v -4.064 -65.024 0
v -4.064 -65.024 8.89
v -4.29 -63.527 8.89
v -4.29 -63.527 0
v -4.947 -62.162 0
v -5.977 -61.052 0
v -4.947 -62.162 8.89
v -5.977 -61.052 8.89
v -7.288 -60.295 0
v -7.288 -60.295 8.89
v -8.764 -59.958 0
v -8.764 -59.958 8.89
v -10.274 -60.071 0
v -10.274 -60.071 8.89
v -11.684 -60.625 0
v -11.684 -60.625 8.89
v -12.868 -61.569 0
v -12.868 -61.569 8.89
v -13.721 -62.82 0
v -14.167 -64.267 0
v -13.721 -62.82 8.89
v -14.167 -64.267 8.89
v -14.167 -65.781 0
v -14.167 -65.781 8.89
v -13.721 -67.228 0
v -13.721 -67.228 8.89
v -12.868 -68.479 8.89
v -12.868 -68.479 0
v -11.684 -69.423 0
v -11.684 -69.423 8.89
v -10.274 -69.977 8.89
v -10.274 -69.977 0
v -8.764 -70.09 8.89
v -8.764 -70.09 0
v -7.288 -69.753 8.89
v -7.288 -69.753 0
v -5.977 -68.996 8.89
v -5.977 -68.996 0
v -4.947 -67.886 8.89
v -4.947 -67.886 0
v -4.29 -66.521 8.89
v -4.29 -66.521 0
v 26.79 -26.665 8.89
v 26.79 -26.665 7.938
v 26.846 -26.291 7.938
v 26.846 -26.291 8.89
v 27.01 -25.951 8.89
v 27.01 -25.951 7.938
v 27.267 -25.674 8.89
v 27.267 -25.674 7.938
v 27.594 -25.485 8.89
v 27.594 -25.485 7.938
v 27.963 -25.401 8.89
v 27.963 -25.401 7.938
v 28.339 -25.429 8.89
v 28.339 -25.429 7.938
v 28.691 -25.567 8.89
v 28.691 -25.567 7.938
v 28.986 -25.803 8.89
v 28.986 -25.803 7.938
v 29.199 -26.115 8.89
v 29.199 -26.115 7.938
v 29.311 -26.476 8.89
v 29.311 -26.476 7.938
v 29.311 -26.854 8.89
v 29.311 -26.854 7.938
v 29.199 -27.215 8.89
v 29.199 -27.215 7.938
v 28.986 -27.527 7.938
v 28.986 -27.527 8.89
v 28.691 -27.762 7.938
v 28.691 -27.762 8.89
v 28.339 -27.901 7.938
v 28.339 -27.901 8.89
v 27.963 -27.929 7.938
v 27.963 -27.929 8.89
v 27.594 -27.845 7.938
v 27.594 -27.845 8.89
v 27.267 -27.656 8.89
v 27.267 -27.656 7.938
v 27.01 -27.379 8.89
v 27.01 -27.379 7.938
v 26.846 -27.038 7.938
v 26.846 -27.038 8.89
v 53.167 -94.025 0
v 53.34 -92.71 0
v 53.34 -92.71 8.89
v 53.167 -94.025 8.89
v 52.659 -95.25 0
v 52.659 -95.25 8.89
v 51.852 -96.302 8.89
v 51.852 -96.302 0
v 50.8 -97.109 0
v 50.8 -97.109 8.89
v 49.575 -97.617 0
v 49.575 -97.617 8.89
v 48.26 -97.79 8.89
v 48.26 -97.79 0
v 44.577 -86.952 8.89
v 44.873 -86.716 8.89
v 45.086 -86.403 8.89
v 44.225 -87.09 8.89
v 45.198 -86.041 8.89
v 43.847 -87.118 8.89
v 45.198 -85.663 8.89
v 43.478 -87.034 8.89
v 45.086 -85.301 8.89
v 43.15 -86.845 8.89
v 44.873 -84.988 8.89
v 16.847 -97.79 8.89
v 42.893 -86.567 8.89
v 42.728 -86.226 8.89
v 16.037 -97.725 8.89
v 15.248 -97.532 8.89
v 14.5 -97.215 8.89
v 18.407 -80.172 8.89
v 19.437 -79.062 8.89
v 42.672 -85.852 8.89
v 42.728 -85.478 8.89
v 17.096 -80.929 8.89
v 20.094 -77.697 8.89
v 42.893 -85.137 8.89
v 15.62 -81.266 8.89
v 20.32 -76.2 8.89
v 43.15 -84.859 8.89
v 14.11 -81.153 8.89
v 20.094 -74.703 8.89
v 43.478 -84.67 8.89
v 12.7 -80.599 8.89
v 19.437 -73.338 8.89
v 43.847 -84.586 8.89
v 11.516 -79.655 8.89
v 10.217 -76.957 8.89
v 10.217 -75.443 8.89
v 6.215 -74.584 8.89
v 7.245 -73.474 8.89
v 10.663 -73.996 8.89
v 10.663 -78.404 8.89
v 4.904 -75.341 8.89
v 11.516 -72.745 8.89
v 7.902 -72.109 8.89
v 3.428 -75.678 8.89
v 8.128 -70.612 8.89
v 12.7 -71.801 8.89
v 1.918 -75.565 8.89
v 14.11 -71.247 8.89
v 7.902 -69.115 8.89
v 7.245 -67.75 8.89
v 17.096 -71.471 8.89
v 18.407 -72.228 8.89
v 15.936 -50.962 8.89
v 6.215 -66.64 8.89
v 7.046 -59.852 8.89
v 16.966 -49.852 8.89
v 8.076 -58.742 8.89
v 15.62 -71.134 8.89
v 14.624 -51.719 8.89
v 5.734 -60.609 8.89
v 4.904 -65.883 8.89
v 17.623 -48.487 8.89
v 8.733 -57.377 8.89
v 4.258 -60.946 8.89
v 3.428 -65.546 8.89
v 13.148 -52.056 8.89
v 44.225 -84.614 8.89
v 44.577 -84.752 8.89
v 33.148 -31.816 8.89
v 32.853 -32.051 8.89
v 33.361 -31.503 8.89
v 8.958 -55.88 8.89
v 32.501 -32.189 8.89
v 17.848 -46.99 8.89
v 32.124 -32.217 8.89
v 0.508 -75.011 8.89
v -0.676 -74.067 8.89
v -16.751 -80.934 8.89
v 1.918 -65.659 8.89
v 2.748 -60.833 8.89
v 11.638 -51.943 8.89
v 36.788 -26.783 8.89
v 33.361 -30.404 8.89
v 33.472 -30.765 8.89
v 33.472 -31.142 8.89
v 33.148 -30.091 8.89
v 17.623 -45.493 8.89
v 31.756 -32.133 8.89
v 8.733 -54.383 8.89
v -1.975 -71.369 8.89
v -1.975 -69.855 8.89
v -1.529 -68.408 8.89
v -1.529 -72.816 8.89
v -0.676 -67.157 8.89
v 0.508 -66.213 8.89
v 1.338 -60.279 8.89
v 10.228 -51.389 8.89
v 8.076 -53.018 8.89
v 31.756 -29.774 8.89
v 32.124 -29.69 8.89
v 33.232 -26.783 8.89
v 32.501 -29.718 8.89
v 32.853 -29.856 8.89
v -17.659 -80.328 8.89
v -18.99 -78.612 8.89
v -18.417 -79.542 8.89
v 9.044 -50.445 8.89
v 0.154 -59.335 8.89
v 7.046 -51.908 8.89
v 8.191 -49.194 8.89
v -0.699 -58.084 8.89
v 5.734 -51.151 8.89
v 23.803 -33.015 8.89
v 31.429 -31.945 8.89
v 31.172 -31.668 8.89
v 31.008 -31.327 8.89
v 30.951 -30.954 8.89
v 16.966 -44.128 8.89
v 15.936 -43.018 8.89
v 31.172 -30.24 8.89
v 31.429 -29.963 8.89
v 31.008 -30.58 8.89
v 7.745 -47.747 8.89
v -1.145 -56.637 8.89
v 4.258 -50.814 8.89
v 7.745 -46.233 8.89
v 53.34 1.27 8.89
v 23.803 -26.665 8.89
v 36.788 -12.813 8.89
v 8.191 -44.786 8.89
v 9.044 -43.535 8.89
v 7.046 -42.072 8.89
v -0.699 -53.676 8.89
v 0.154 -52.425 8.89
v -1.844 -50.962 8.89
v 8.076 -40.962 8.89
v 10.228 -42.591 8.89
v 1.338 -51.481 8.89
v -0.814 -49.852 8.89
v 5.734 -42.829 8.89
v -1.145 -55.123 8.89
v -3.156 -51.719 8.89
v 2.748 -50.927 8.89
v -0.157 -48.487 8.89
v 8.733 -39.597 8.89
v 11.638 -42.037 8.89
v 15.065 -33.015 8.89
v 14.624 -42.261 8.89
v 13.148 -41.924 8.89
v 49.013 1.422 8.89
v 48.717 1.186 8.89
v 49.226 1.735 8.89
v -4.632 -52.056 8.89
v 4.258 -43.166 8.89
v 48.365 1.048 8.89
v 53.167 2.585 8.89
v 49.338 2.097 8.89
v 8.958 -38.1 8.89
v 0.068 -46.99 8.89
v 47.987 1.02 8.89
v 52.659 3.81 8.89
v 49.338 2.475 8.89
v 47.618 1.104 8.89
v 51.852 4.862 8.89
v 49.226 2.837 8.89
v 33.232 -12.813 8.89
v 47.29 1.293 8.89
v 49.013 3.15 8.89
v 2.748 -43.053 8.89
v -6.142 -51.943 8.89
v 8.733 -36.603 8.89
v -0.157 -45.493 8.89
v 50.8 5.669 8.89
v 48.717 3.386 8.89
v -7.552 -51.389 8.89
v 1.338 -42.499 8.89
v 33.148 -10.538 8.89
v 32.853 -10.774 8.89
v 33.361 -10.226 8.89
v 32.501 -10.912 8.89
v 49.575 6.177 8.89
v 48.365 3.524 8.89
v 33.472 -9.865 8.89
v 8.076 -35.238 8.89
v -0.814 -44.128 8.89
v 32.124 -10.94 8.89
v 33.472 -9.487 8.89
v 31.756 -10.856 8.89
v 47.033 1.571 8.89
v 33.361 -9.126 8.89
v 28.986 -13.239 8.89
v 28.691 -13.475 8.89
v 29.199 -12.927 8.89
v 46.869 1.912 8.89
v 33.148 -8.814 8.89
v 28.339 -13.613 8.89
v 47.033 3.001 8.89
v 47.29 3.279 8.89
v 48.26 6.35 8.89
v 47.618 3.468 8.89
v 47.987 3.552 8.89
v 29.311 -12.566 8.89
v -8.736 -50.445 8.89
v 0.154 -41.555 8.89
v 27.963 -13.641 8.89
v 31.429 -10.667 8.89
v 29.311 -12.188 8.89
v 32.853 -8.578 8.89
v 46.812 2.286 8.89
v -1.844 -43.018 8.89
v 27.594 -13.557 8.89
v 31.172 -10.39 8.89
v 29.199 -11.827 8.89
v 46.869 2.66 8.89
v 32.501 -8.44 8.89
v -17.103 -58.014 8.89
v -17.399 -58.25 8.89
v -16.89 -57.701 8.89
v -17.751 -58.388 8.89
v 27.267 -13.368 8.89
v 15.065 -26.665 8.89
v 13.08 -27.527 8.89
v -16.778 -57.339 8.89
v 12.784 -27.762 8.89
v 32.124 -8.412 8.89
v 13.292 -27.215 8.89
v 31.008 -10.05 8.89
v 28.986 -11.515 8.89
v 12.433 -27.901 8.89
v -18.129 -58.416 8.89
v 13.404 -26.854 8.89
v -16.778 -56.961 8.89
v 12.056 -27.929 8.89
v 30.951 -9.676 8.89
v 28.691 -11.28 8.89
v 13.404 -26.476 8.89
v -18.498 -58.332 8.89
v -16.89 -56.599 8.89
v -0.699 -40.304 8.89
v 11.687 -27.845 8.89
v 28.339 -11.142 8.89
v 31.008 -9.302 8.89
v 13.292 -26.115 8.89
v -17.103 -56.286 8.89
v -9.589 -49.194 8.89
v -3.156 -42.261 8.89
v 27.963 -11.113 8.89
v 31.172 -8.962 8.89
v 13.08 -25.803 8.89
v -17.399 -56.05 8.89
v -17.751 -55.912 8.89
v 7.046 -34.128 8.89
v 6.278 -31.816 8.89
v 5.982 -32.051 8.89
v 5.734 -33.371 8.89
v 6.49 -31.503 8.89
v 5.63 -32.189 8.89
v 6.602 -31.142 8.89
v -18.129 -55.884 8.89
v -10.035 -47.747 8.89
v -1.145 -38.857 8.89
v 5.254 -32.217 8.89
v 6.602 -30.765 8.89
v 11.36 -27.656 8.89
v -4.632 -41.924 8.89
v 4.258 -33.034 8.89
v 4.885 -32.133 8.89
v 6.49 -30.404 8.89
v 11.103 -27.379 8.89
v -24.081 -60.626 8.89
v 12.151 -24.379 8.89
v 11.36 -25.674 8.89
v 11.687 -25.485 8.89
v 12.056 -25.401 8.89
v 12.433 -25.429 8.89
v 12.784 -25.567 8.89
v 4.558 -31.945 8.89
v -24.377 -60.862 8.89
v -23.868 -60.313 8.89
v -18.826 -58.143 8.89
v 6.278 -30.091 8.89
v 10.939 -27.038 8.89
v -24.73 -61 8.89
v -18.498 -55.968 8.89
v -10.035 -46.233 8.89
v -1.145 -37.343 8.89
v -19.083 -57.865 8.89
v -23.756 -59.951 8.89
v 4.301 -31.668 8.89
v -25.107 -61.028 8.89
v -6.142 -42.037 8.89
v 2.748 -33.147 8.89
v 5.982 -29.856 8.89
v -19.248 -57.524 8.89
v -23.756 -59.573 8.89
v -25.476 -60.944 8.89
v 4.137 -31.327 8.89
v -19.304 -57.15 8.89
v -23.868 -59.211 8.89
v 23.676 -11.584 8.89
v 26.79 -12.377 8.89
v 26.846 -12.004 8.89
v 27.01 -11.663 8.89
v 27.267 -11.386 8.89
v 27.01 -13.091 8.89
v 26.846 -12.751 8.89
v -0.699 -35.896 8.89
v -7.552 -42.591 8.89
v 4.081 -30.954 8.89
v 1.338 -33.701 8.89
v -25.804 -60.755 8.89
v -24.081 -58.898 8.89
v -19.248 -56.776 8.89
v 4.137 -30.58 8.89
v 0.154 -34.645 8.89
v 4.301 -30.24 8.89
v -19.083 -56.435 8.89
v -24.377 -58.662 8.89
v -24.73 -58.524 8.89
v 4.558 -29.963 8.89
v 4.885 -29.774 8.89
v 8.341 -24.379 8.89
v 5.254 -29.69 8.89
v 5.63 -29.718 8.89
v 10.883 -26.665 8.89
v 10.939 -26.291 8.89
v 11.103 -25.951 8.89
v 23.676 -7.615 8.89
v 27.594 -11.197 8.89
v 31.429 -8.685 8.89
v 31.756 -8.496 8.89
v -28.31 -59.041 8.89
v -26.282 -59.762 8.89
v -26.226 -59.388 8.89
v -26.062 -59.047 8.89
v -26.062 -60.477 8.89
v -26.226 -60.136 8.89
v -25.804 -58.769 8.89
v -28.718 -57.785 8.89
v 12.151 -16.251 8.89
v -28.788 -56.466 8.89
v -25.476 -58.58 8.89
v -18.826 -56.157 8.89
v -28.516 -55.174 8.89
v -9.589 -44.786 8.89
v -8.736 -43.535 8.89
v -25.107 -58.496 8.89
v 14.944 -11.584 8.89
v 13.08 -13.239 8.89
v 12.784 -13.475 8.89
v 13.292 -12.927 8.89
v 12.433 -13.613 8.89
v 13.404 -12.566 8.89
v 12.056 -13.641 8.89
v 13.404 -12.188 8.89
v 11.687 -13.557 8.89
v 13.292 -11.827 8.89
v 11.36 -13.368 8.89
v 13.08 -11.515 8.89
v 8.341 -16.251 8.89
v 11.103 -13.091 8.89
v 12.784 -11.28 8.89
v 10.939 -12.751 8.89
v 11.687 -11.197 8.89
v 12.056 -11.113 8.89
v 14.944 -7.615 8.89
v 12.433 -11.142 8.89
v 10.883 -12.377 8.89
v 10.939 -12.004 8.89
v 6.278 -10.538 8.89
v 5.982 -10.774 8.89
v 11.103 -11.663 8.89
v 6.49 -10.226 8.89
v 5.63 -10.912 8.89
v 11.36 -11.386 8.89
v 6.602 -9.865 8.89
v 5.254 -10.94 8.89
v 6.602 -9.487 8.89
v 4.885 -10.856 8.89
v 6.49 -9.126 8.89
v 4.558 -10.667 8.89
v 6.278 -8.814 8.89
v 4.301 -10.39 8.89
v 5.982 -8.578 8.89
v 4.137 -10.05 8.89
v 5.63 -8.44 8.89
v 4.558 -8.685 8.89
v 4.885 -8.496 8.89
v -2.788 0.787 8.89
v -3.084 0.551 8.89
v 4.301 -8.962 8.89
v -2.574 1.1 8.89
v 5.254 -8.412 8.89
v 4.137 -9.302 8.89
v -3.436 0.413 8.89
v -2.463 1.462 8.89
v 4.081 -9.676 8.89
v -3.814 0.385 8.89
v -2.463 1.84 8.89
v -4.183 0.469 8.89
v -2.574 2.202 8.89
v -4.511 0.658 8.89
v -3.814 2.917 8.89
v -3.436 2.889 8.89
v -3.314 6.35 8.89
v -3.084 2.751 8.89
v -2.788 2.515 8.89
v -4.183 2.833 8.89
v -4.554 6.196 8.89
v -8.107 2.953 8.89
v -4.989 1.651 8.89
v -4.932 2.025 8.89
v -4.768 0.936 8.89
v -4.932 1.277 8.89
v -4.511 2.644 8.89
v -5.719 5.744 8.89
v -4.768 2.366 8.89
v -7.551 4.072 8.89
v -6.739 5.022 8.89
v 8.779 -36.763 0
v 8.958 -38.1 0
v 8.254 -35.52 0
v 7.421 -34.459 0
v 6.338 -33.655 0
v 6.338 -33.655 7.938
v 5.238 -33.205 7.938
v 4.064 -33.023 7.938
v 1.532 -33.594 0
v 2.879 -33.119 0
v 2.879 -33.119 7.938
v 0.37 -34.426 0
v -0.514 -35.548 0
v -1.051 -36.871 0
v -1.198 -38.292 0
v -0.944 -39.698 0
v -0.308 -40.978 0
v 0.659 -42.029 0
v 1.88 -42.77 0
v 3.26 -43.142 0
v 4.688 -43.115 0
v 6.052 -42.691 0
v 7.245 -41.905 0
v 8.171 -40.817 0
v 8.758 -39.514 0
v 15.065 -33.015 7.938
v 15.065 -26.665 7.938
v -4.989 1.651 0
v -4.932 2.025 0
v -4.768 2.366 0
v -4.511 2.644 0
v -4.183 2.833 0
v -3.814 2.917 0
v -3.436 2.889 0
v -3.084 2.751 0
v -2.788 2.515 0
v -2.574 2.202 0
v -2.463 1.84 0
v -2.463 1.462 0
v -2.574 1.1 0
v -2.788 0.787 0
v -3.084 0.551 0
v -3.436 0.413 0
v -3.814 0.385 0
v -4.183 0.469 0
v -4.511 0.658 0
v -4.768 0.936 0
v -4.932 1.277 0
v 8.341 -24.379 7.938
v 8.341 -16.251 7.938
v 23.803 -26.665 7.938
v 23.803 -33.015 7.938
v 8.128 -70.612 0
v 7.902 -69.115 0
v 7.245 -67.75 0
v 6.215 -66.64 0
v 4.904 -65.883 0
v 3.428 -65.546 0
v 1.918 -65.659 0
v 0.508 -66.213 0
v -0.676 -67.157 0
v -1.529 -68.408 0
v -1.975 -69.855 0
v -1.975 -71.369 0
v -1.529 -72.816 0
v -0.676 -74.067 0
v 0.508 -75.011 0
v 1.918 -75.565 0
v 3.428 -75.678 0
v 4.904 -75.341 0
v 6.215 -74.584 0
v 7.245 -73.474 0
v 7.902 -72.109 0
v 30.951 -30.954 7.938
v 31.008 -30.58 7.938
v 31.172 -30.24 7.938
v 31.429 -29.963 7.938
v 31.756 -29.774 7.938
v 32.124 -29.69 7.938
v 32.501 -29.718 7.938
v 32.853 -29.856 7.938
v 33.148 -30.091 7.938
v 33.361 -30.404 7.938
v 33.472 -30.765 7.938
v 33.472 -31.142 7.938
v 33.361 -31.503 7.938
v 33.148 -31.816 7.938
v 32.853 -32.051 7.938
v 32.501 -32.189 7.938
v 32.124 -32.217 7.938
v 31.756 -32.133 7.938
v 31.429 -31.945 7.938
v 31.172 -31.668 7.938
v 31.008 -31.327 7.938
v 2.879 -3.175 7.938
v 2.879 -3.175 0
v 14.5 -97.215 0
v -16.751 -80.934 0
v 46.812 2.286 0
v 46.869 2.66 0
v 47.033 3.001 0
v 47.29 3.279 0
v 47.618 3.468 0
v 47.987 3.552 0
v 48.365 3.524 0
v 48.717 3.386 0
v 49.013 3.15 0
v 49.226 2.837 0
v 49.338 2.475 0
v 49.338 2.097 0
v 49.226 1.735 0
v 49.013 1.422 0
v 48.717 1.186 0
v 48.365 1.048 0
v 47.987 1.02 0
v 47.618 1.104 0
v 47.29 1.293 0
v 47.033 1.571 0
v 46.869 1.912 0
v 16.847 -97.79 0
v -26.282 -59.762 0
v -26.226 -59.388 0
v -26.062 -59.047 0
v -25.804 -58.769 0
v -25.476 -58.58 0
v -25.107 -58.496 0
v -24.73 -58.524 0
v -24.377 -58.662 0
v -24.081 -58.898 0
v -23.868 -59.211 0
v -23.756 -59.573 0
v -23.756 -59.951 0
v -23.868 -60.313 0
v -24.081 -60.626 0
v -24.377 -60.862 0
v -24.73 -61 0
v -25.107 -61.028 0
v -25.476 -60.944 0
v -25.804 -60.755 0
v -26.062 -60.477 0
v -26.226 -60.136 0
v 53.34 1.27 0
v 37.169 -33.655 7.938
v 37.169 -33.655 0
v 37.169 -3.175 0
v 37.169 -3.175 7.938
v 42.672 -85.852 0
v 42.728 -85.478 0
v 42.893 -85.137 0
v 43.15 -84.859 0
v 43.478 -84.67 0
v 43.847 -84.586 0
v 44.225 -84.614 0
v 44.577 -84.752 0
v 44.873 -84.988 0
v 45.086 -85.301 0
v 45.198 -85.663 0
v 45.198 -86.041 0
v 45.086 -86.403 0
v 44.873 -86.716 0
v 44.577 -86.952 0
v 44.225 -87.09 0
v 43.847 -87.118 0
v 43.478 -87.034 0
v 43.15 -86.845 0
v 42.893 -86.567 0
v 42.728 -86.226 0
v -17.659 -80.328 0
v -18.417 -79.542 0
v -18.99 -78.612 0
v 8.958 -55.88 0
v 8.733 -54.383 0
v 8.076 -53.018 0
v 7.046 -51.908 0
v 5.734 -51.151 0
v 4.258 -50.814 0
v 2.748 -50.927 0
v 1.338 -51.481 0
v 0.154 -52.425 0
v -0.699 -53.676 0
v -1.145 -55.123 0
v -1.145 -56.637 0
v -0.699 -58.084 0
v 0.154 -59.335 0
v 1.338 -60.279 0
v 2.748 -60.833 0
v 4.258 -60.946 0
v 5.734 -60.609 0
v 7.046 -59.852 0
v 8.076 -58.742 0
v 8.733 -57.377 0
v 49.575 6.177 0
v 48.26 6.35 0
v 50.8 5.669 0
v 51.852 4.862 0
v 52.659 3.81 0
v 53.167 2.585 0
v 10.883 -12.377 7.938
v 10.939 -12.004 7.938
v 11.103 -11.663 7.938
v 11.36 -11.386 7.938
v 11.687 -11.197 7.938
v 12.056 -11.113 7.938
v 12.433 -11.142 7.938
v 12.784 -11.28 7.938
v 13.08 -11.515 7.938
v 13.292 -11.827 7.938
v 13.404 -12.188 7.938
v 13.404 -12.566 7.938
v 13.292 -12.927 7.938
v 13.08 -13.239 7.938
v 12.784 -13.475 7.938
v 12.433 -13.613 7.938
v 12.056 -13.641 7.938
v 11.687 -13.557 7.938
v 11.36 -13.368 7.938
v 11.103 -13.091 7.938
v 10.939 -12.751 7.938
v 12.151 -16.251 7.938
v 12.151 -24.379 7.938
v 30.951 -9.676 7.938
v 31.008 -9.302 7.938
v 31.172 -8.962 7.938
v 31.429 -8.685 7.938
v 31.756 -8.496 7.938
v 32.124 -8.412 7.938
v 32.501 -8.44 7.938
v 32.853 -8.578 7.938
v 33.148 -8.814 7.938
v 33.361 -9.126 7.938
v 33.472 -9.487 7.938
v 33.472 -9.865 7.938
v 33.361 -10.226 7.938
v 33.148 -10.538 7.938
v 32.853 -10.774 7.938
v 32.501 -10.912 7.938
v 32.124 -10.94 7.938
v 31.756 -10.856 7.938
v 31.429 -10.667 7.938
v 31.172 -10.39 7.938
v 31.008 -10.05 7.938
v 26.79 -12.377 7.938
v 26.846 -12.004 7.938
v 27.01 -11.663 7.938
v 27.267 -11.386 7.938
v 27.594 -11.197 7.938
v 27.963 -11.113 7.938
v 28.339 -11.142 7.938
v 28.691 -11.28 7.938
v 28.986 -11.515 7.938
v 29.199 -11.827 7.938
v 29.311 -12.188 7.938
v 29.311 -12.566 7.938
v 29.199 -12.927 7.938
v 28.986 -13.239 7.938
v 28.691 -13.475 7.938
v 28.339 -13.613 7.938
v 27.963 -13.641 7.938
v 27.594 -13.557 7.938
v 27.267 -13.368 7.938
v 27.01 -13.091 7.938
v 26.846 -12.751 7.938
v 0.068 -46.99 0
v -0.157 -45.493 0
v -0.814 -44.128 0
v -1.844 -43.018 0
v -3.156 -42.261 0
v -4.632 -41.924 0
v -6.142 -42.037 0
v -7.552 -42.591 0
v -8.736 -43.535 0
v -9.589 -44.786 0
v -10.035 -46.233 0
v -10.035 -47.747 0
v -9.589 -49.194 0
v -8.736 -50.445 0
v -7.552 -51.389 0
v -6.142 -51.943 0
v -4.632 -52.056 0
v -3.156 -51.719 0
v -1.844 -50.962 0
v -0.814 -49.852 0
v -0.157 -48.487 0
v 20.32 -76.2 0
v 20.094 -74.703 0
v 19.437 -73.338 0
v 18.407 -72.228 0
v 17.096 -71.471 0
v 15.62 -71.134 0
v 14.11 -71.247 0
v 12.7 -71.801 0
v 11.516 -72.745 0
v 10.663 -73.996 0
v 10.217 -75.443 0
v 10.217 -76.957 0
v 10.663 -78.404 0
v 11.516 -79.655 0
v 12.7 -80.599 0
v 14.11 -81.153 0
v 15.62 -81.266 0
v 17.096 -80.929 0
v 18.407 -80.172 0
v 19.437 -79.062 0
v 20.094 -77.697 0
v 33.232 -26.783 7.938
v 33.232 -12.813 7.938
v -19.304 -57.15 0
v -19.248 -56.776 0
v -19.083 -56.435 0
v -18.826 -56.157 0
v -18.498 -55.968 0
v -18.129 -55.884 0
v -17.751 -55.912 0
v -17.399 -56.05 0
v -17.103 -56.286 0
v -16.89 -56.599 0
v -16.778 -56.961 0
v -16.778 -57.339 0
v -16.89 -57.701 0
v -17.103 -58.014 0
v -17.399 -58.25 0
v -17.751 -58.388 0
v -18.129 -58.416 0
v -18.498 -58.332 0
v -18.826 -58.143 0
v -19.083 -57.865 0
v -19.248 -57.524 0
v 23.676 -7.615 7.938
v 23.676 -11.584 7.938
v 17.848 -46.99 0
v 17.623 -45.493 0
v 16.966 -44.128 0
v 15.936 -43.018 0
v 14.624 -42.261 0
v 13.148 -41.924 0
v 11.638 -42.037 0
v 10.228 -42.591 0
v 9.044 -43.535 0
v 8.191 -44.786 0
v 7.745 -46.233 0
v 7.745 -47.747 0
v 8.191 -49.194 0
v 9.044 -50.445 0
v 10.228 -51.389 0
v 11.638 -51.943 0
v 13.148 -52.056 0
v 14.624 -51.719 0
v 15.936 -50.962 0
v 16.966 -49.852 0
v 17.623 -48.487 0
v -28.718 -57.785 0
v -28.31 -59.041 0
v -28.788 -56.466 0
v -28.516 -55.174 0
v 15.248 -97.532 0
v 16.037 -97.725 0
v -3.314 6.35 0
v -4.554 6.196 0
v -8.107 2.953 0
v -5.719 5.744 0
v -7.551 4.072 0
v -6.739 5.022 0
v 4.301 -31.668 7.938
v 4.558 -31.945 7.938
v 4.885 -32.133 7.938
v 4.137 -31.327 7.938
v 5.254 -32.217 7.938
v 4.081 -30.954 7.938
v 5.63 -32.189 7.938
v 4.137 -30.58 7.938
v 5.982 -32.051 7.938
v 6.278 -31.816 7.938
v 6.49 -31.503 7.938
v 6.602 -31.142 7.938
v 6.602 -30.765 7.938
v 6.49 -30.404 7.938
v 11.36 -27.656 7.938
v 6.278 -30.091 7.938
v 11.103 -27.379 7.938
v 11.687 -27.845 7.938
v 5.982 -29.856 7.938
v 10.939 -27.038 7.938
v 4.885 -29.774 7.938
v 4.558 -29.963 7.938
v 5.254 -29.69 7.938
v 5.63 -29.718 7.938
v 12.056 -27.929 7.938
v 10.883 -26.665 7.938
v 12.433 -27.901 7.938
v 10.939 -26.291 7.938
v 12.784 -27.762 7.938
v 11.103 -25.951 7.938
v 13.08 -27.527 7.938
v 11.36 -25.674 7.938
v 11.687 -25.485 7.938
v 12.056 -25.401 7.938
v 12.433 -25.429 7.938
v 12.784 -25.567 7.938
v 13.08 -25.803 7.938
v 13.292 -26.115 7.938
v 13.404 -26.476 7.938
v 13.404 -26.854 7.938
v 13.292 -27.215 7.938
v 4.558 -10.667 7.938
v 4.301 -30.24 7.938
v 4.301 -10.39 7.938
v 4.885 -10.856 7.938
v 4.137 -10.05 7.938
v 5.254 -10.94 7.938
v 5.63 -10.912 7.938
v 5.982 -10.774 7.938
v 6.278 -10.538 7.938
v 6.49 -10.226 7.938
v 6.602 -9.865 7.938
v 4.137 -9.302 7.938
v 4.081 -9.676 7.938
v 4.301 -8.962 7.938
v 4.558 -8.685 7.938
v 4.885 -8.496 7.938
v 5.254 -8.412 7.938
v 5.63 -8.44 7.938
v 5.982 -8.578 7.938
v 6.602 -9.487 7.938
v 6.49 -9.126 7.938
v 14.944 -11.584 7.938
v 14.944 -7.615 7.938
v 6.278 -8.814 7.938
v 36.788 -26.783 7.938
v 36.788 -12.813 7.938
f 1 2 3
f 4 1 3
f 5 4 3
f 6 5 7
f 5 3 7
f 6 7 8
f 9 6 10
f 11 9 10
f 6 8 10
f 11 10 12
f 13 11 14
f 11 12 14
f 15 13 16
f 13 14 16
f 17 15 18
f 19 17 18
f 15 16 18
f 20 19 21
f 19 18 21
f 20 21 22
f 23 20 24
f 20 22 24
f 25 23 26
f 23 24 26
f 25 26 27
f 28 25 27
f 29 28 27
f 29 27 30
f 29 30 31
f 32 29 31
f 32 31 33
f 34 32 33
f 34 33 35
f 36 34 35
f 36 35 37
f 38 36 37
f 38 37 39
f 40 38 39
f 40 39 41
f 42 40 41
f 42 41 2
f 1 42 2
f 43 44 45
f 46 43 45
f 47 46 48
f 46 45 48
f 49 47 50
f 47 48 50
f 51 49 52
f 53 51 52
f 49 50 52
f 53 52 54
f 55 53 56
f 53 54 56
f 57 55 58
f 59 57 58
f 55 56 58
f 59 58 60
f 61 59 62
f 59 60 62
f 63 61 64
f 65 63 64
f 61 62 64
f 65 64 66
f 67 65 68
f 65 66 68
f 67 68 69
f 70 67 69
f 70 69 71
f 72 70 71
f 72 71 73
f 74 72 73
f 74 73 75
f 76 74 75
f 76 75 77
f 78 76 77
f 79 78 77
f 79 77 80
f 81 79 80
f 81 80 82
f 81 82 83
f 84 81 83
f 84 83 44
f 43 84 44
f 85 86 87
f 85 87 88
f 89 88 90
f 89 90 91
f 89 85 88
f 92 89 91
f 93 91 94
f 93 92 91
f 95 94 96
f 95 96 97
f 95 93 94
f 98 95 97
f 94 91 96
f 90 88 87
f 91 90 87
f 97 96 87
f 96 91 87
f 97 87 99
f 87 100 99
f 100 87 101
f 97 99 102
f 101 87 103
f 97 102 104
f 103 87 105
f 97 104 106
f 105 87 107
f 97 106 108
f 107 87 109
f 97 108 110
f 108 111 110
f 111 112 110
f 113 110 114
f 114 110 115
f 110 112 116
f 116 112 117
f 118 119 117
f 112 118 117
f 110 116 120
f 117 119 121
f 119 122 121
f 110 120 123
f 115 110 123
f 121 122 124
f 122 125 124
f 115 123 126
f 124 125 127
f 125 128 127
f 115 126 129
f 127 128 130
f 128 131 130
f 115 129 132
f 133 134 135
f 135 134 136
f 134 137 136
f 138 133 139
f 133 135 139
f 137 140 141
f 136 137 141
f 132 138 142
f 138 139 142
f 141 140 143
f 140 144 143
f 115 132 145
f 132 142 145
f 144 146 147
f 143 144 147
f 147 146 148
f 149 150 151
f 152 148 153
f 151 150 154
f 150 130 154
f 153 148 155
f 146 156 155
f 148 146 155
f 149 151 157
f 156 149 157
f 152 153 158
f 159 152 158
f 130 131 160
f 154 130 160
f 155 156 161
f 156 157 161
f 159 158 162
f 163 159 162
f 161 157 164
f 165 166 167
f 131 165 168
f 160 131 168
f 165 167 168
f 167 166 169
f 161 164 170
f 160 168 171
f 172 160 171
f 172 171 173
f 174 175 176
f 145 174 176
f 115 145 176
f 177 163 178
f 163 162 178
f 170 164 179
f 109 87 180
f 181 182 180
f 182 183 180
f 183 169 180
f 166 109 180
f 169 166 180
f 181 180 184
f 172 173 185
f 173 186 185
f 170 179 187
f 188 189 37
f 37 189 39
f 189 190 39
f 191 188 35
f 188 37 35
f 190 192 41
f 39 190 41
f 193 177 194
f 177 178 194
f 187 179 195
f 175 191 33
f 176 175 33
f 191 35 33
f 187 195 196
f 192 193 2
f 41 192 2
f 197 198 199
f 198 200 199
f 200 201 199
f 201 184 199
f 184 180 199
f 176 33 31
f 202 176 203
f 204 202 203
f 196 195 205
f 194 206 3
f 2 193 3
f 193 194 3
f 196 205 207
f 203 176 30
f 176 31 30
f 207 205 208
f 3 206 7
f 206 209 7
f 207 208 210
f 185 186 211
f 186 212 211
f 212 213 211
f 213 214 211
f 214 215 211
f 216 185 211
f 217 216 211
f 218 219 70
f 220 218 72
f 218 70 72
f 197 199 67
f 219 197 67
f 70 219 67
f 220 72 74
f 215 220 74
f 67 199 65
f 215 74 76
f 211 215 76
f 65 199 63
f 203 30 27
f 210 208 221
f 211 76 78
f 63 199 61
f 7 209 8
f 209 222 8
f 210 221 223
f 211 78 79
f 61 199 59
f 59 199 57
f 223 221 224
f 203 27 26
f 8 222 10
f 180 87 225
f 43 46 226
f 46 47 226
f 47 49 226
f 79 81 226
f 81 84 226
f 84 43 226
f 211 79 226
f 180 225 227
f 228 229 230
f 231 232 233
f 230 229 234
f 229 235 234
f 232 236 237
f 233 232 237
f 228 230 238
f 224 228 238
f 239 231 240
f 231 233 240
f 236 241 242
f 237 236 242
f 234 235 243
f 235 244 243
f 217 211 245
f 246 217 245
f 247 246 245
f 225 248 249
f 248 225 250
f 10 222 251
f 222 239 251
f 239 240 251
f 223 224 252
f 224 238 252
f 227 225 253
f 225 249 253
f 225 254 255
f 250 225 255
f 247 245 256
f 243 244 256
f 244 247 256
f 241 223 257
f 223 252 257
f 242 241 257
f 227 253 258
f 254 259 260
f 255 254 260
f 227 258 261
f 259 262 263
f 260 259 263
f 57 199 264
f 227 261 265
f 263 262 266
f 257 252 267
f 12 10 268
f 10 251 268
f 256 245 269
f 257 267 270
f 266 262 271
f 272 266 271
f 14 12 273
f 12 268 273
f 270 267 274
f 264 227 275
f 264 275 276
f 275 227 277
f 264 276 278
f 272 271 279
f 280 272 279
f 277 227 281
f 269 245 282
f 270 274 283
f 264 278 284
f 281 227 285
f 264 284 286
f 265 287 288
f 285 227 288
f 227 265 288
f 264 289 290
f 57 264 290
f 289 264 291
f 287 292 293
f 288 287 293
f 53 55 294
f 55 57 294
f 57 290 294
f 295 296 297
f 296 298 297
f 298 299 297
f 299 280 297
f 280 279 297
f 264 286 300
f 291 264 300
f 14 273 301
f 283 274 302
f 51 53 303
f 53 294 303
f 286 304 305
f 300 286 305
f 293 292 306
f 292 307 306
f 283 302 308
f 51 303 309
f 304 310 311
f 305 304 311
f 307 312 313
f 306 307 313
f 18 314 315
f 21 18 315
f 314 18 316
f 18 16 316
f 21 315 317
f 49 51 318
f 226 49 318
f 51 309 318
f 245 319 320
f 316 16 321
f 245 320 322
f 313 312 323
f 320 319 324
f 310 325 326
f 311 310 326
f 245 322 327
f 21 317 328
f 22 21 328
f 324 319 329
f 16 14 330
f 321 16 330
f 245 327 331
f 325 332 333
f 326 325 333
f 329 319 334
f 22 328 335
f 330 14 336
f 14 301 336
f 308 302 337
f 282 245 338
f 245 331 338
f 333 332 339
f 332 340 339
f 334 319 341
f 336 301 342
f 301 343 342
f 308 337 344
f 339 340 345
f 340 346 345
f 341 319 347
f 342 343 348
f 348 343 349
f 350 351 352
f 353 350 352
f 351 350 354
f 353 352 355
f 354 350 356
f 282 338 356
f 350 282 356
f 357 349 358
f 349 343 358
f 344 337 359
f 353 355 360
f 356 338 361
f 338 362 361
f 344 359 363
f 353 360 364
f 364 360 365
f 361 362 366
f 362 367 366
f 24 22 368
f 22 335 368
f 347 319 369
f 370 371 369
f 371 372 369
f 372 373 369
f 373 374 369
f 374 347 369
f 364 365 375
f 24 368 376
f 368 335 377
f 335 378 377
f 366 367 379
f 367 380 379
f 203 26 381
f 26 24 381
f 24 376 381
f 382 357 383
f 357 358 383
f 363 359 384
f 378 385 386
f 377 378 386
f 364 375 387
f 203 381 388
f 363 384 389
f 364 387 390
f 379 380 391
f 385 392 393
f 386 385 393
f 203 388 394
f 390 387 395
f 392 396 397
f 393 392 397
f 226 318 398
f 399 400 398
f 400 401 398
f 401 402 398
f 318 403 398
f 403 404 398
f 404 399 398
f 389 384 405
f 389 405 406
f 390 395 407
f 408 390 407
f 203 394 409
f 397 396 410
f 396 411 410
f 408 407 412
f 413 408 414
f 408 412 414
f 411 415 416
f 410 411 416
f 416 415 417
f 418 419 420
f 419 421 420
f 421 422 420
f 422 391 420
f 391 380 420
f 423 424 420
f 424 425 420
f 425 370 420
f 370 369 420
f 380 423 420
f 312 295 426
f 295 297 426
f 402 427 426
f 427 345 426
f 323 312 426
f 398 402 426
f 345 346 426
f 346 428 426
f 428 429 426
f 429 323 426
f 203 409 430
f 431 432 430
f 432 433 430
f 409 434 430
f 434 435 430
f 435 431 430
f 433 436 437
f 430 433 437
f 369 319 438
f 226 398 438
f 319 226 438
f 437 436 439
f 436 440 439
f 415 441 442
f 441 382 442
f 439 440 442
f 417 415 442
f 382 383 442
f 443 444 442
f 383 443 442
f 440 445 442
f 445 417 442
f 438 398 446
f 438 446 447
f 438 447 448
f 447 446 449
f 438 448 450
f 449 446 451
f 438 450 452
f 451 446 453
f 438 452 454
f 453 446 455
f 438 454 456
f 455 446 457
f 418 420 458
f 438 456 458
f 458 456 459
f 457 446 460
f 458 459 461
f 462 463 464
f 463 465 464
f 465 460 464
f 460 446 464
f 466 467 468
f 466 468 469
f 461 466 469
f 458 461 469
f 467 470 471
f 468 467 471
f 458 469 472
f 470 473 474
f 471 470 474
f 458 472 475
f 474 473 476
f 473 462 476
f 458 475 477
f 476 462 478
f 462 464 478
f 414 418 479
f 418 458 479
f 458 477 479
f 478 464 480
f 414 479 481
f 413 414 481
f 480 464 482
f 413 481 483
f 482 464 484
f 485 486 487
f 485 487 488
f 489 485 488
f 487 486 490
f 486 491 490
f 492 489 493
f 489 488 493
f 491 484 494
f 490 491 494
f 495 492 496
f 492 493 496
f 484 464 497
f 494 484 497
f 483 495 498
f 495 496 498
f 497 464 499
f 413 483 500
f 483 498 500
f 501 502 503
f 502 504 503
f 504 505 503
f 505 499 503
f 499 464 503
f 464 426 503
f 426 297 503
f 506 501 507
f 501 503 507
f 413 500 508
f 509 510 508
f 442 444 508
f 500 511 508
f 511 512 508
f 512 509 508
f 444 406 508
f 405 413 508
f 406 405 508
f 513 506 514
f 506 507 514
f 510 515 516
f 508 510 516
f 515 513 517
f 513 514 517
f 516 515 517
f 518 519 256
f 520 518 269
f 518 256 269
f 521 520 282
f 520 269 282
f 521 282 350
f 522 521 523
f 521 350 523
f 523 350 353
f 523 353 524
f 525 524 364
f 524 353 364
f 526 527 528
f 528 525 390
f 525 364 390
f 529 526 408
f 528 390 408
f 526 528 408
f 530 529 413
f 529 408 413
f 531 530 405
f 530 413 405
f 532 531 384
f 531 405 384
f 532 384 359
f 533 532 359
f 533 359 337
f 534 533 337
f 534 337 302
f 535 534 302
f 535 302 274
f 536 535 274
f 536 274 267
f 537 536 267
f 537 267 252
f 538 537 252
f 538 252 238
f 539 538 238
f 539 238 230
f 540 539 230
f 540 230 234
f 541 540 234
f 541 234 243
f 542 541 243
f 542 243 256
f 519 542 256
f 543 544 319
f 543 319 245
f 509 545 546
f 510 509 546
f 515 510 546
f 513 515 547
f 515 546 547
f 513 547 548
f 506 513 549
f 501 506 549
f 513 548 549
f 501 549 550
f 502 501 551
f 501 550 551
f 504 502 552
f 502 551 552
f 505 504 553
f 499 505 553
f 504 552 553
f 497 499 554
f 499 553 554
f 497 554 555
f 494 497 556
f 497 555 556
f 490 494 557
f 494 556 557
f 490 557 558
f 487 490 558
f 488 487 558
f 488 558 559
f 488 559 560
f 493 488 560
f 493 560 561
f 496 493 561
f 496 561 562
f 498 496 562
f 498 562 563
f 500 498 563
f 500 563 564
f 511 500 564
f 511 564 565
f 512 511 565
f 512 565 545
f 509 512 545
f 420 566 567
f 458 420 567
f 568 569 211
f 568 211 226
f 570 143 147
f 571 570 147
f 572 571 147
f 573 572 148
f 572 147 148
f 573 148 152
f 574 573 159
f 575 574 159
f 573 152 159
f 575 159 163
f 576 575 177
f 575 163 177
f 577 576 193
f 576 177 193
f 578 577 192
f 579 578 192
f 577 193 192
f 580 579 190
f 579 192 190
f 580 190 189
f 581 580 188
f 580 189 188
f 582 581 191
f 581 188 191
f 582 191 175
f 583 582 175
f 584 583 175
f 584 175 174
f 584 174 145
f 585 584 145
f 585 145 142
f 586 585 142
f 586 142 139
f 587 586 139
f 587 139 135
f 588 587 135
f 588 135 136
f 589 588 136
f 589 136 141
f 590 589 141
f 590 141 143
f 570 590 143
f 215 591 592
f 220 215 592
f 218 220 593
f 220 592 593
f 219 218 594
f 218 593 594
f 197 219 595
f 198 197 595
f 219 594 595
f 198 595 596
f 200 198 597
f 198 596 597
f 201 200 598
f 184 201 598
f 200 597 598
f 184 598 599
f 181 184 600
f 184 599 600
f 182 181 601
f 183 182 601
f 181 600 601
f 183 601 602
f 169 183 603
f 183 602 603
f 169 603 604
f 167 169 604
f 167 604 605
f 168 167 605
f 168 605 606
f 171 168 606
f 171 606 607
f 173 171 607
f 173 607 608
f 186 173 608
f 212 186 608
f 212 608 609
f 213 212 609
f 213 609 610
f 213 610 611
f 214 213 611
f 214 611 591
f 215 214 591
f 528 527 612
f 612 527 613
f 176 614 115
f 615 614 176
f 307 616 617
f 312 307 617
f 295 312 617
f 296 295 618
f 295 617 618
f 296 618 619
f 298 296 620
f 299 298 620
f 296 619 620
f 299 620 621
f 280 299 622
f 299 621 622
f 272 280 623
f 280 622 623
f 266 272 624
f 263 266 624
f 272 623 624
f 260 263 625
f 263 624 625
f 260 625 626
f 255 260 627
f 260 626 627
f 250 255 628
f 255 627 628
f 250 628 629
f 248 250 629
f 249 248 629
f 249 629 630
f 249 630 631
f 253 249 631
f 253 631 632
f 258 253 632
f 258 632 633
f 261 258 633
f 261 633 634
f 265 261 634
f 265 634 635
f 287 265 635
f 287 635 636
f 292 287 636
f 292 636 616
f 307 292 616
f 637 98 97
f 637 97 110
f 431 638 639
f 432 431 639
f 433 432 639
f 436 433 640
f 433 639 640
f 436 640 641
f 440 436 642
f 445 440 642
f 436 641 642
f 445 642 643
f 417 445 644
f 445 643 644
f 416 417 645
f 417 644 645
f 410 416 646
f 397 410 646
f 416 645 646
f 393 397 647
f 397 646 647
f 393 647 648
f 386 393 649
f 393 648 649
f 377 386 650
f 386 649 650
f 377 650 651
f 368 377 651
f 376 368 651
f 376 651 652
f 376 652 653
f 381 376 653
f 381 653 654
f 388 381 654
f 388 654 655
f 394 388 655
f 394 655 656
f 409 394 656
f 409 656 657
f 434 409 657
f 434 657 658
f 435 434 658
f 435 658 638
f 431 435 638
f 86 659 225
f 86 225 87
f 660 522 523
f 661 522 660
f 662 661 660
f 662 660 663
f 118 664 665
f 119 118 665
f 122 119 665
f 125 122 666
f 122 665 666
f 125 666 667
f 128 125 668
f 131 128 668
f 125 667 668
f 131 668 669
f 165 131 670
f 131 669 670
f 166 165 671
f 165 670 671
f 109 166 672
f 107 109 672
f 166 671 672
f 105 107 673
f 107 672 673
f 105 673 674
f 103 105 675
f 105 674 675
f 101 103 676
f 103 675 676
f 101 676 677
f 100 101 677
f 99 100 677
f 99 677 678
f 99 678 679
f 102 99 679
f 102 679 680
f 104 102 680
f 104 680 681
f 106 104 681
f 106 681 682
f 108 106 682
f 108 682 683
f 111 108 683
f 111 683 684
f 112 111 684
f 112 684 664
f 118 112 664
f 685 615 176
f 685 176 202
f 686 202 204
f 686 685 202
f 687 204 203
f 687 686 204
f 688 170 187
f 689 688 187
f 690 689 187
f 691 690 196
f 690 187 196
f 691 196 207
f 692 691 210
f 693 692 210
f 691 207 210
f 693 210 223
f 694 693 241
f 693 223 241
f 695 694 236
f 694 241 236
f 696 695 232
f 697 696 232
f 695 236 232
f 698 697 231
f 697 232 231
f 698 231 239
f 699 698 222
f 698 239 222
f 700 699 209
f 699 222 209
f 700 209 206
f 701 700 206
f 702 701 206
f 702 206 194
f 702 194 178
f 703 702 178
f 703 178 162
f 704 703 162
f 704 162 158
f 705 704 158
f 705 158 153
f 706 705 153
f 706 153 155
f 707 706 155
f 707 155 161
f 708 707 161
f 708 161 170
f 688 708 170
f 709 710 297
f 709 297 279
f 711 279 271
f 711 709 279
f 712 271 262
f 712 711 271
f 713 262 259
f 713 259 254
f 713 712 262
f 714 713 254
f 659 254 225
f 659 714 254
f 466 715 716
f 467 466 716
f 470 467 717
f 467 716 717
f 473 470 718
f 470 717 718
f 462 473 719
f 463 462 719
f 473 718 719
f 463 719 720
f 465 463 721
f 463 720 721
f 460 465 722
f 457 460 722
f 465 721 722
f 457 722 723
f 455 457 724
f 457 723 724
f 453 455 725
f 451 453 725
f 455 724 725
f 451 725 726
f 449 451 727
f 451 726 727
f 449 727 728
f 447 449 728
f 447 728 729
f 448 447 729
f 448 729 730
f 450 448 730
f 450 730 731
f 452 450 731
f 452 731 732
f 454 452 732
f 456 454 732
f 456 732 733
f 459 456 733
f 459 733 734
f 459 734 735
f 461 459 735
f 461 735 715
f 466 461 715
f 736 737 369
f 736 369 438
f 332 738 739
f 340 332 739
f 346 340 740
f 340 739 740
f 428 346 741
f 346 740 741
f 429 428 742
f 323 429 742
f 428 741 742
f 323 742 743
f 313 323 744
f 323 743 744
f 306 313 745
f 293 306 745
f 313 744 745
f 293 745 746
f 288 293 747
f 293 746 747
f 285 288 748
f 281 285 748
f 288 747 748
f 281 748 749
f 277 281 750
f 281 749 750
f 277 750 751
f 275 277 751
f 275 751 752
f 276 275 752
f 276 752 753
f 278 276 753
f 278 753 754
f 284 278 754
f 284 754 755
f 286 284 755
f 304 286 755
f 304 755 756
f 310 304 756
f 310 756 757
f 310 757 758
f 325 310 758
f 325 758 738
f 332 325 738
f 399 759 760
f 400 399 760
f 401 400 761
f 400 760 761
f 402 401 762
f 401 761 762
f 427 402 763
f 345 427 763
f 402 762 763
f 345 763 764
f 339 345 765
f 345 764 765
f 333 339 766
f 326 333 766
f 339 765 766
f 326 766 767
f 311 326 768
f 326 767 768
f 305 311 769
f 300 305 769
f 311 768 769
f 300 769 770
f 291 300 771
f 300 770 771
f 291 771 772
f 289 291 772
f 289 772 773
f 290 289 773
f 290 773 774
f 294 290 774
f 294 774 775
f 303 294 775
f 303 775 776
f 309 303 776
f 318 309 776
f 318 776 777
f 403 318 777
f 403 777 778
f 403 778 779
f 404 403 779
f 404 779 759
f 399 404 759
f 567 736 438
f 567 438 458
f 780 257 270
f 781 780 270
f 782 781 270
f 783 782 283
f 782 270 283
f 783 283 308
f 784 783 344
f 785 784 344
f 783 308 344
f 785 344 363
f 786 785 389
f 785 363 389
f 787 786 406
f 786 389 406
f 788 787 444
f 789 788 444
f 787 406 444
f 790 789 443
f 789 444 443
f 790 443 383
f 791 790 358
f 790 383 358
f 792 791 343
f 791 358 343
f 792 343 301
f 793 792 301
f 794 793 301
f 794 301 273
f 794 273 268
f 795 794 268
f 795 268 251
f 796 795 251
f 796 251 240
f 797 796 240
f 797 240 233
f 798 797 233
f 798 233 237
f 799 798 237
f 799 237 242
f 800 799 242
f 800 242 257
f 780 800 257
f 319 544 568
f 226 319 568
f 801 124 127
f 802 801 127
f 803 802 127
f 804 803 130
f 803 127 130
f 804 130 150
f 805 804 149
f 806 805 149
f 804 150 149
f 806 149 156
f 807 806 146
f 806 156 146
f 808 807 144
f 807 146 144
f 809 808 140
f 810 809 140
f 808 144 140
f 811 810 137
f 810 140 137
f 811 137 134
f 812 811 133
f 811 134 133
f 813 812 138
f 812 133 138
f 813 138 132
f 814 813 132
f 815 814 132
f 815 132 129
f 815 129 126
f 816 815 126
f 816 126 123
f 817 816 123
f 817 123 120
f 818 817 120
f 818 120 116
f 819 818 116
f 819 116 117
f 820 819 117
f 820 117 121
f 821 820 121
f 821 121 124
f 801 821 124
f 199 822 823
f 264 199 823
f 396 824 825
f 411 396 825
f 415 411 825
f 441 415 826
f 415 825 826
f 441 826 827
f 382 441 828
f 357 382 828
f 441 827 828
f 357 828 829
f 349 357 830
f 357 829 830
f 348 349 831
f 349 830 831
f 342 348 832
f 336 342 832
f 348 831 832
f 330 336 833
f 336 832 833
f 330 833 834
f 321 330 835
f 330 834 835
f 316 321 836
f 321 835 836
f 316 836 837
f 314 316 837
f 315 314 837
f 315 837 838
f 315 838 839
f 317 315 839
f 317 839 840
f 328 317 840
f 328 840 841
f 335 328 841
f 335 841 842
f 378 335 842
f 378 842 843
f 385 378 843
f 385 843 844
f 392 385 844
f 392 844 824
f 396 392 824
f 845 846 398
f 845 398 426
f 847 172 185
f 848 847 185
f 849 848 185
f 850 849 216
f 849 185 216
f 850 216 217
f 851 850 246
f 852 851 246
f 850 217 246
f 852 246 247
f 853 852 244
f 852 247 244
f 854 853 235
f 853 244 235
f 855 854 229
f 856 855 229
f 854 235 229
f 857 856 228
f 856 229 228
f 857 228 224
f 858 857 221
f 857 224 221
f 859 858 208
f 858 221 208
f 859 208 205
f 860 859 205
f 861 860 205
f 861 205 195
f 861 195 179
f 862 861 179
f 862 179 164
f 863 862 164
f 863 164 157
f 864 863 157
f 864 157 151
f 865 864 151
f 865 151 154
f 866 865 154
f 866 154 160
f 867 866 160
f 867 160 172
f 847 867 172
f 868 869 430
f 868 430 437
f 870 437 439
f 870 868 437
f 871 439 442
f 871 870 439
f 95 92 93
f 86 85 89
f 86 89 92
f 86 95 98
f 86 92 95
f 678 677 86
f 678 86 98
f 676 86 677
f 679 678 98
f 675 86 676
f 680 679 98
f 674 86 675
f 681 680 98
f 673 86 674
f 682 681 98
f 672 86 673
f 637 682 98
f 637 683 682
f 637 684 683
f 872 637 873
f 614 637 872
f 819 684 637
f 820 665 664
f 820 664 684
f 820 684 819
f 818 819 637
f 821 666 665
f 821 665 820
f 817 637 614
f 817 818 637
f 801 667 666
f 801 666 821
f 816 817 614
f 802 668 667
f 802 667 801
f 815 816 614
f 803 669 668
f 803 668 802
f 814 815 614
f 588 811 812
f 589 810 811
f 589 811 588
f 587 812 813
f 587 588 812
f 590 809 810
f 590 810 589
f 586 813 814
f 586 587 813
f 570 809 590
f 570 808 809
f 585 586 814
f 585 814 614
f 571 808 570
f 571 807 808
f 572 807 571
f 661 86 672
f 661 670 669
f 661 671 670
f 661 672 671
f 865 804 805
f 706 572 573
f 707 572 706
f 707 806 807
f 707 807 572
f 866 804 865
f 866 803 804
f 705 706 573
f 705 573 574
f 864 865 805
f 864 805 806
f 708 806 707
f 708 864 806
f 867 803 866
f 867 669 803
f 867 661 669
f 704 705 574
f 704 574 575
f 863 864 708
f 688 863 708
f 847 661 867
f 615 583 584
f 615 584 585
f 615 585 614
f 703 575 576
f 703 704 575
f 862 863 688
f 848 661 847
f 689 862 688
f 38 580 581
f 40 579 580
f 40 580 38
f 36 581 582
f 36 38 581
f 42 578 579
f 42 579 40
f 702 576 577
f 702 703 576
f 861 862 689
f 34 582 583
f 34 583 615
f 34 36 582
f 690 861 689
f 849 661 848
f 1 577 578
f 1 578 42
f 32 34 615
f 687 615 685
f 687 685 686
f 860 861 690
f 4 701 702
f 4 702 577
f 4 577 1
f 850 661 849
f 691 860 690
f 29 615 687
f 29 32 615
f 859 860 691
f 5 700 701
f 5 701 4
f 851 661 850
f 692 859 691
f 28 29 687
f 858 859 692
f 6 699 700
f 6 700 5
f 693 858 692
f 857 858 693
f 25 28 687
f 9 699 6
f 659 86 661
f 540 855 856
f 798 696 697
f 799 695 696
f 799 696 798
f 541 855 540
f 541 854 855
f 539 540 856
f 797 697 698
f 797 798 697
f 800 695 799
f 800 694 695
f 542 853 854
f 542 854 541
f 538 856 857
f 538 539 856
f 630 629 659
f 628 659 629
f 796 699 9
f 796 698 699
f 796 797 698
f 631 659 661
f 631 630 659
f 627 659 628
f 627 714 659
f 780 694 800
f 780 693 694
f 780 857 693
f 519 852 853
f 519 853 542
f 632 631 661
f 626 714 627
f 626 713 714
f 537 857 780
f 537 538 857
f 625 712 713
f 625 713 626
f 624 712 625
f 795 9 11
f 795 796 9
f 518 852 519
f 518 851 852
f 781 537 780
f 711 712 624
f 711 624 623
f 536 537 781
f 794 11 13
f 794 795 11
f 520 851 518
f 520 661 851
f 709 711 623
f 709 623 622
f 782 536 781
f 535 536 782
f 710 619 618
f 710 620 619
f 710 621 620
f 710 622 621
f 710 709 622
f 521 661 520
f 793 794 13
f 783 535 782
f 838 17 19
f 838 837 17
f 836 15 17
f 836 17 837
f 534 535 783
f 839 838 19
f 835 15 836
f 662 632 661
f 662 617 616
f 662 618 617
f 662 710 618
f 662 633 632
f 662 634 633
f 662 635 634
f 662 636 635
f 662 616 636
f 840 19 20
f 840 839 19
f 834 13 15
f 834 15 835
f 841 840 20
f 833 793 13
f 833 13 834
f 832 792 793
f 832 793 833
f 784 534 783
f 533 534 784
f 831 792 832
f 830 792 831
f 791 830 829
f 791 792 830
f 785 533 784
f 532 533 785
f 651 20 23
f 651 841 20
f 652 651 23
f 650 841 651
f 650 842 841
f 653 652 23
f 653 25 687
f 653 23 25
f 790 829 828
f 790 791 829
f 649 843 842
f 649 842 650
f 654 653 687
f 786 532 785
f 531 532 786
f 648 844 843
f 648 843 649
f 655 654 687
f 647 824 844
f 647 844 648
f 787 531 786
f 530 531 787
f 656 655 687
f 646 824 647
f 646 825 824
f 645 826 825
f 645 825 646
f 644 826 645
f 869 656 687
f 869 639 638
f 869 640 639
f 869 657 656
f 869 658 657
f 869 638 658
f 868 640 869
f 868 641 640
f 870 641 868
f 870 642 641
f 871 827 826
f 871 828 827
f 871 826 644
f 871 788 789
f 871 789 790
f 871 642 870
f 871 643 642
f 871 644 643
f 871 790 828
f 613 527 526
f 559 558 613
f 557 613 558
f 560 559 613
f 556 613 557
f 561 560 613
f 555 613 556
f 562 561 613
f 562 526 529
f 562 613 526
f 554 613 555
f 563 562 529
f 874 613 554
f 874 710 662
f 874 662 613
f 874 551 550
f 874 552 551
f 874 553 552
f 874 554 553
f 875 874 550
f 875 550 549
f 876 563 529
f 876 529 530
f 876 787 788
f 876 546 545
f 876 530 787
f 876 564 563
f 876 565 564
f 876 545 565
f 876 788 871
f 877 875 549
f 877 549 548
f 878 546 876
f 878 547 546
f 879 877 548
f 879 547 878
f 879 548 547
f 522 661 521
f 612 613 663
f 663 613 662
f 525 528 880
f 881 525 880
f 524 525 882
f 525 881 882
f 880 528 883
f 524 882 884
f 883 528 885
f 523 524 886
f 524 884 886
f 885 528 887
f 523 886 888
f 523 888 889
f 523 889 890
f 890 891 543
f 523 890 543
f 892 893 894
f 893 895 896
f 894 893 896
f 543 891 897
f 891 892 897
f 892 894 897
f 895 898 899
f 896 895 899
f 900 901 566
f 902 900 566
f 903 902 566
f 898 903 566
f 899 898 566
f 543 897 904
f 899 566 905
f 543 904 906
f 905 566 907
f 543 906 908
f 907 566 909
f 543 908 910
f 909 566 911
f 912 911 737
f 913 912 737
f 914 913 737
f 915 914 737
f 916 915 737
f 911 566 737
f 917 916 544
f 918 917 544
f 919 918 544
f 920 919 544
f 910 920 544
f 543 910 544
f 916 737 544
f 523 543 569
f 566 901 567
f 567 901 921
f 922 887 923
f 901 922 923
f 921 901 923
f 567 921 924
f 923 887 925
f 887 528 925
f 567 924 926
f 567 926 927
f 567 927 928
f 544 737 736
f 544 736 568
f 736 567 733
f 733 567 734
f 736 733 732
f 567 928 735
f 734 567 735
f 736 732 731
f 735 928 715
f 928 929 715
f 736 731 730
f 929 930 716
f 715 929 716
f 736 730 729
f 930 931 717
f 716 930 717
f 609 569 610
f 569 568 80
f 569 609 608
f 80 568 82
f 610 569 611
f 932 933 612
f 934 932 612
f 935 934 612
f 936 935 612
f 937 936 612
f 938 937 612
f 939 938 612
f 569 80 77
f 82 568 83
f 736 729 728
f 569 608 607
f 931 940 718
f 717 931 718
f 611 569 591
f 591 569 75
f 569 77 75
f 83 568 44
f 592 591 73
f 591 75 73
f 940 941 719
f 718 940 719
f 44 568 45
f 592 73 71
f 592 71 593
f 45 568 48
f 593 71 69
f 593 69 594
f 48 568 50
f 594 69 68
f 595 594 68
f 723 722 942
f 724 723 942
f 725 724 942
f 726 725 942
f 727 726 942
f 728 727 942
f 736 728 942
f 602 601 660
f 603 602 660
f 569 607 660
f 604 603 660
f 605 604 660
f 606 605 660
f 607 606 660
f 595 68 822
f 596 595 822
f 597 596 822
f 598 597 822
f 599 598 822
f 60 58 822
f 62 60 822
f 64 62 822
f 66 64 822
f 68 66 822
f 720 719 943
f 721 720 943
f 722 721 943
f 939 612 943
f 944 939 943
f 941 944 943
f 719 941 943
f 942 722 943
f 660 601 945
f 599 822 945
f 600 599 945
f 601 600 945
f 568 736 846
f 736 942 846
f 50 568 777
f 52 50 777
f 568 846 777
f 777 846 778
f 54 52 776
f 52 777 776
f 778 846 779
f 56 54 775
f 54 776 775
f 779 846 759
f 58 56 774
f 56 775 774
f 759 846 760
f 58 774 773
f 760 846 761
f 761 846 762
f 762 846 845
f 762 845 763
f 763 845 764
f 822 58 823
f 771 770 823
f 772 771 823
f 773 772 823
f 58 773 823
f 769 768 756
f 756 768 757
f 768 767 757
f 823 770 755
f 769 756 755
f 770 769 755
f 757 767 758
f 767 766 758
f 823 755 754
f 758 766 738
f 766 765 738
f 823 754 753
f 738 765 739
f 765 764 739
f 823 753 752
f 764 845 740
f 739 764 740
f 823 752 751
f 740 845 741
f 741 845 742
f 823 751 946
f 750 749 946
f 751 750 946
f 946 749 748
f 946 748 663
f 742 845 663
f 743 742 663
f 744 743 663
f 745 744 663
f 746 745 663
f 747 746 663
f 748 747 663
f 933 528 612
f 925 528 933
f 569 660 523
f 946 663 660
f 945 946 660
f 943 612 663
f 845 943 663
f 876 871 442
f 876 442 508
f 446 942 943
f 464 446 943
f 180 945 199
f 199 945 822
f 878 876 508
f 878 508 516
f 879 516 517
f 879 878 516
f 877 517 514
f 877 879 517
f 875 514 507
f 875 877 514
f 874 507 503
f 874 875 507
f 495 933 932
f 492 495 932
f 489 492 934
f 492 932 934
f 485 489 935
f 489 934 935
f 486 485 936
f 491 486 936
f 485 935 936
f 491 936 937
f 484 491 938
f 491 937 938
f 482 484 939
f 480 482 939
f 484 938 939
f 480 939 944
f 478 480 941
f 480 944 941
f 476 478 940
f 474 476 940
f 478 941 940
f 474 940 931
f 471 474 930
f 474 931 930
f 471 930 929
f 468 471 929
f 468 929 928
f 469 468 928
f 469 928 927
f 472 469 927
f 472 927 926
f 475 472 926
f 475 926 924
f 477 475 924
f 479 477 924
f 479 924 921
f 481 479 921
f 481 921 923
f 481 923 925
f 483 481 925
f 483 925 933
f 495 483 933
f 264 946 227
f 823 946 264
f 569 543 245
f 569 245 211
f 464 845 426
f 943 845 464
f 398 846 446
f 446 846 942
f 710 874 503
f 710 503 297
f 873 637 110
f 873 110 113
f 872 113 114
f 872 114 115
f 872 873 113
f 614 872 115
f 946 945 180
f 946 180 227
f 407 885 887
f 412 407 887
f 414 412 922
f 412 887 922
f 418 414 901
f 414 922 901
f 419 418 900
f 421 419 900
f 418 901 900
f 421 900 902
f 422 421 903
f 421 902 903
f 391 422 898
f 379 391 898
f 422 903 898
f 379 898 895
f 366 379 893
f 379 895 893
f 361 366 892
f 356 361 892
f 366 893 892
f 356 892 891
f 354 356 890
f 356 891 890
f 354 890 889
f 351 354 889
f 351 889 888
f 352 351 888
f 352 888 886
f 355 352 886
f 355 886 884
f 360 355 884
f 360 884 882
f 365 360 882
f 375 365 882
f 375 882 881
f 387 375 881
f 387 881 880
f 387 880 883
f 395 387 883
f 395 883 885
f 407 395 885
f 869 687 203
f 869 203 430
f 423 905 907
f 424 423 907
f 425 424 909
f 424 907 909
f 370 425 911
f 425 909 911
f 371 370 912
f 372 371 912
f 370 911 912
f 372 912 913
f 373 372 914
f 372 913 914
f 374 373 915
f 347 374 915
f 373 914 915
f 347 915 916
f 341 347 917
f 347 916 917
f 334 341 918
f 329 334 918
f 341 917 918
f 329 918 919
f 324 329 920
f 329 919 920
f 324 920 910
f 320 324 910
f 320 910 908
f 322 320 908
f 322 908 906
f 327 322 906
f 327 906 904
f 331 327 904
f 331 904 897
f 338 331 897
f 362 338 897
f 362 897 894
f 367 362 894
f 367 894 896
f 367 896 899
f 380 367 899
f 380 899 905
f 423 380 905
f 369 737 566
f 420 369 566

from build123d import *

# Parameters (mm, degrees)
BOSS_EXTRUDE1_DEPTH      = 8.89
SKETCH9_R                = 1.267511842
SKETCH9_W                = 3.81
SKETCH9_H                = 8.128
SKETCH9_W_2              = 3.556
SKETCH9_H_2              = 13.97
SKETCH9_W_3              = 8.73125
SKETCH9_H_3              = 3.96875
CUT_EXTRUDE6_DEPTH       = 1
CUT_EXTRUDE6_DEPTH_BACK  = 9.89
SKETCH4_W                = 34.29
SKETCH4_H                = 30.48
CUT_EXTRUDE7_DEPTH       = 7.9375
CUT_EXTRUDE7_DEPTH_BACK  = 1
SKETCH3_R                = 5.08
CUT_EXTRUDE8_DEPTH       = 1
CUT_EXTRUDE8_DEPTH_BACK  = 9.89
SKETCH12_R               = 1.27
CUT_EXTRUDE9_DEPTH       = 1
CUT_EXTRUDE9_DEPTH_BACK  = 9.89
SKETCH15_R               = 1.27
CUT_EXTRUDE10_DEPTH      = 1
CUT_EXTRUDE10_DEPTH_BACK = 9.89


with BuildPart() as part:
    # Sketch1 → Boss-Extrude1 (new body)
    with BuildSketch(Plane.XY):
        with BuildLine():
            Line((-3.314058103, 6.35), (48.26, 6.35))
            ThreePointArc((48.26, 6.35), (51.852102448, 4.862102448), (53.34, 1.27))
            Line((53.34, 1.27), (53.34, -92.71))
            ThreePointArc((53.34, -92.71), (51.852102448, -96.302102448), (48.26, -97.79))
            Line((48.26, -97.79), (16.846989059, -97.79))
            ThreePointArc((16.846989059, -97.79), (15.638688158, -97.644208035), (14.499741809, -97.215200367))
            Line((14.499741809, -97.215200367), (-16.7505185, -80.933552139))
            ThreePointArc((-16.7505185, -80.933552139), (-18.059258376, -79.955412607), (-18.989802686, -78.61241436))
            Line((-18.989802686, -78.61241436), (-28.309569459, -59.040904135))
            ThreePointArc((-28.309569459, -59.040904135), (-28.795802898, -57.127870198), (-28.51617555, -55.173917704))
            Line((-28.51617555, -55.173917704), (-8.107195629, 2.952923842))
            ThreePointArc((-8.107195629, 2.952923842), (-6.251501454, 5.414614163), (-3.314058103, 6.35))
        make_face()
    extrude(amount=BOSS_EXTRUDE1_DEPTH)

    # Sketch9 → Cut-Extrude6 (cut, two sides)
    with BuildSketch(Plane(origin=(0, 0, 0), x_dir=(-1, 0, 0), z_dir=(0, 0, -1))) as cut_extrude6_sk:
        with Locations((-5.348417946, -30.953529248)):
            Circle(SKETCH9_R)
        with Locations((-32.218986844, -9.676052932)):
            Circle(SKETCH9_R)
        with Locations((-12.150498686, -12.37729109)):
            Circle(SKETCH9_R)
        with Locations((-12.150498686, -26.66479109)):
            Circle(SKETCH9_R)
        with Locations((-28.057248686, -12.37729109)):
            Circle(SKETCH9_R)
        with Locations((-5.348417946, -9.676052932)):
            Circle(SKETCH9_R)
        with Locations((-32.218986844, -30.953529248)):
            Circle(SKETCH9_R)
        with Locations((-28.057248686, -26.66479109)):
            Circle(SKETCH9_R)
        with Locations((-10.245904396, -20.31479109)):
            Rectangle(SKETCH9_W, SKETCH9_H)
        Polygon((-15.064842187, -33.01479109), (-23.802748686, -33.01479109), (-23.802748686, -26.66479109), (-20.913498686, -26.66479109), (-15.064842187, -26.66479109), align=None)
        with Locations((-35.010498686, -19.798068783)):
            Rectangle(SKETCH9_W_2, SKETCH9_H_2)
        with Locations((-19.310123686, -9.59916609)):
            Rectangle(SKETCH9_W_3, SKETCH9_H_3)
    extrude(amount=CUT_EXTRUDE6_DEPTH, mode=Mode.SUBTRACT)
    extrude(cut_extrude6_sk.sketch, amount=-CUT_EXTRUDE6_DEPTH_BACK, mode=Mode.SUBTRACT)

    # Sketch4 → Cut-Extrude7 (cut, two sides)
    with BuildSketch(Plane.XY) as cut_extrude7_sk:
        with Locations((20.024498686, -18.415)):
            Rectangle(SKETCH4_W, SKETCH4_H)
    extrude(amount=CUT_EXTRUDE7_DEPTH, mode=Mode.SUBTRACT)
    extrude(cut_extrude7_sk.sketch, amount=-CUT_EXTRUDE7_DEPTH_BACK, mode=Mode.SUBTRACT)

    # Sketch3 → Cut-Extrude8 (cut, two sides)
    with BuildSketch(Plane.XY.offset(8.89)) as cut_extrude8_sk:
        with Locations((3.878385852, -38.1)):
            Circle(SKETCH3_R)
        with Locations((-5.011614148, -46.99)):
            Circle(SKETCH3_R)
        with Locations((3.878385852, -55.88)):
            Circle(SKETCH3_R)
        with Locations((12.768385852, -46.99)):
            Circle(SKETCH3_R)
        with Locations((-9.144, -65.024)):
            Circle(SKETCH3_R)
        with Locations((3.048, -70.612)):
            Circle(SKETCH3_R)
        with Locations((15.24, -76.2)):
            Circle(SKETCH3_R)
    extrude(amount=CUT_EXTRUDE8_DEPTH, mode=Mode.SUBTRACT)
    extrude(cut_extrude8_sk.sketch, amount=-CUT_EXTRUDE8_DEPTH_BACK, mode=Mode.SUBTRACT)

    # Sketch12 → Cut-Extrude9 (cut, two sides)
    with BuildSketch(Plane(origin=(0, 0, 0), x_dir=(-1, 0, 0), z_dir=(0, 0, -1))) as cut_extrude9_sk:
        with Locations((-48.0822, 2.286)):
            Circle(SKETCH12_R)
        with Locations((3.718687848, 1.651)):
            Circle(SKETCH12_R)
        with Locations((25.012261453, -59.761967182)):
            Circle(SKETCH12_R)
    extrude(amount=CUT_EXTRUDE9_DEPTH, mode=Mode.SUBTRACT)
    extrude(cut_extrude9_sk.sketch, amount=-CUT_EXTRUDE9_DEPTH_BACK, mode=Mode.SUBTRACT)

    # Sketch15 → Cut-Extrude10 (cut, two sides)
    with BuildSketch(Plane(origin=(0, 0, 0), x_dir=(-1, 0, 0), z_dir=(0, 0, -1))) as cut_extrude10_sk:
        with Locations((18.034, -57.15)):
            Circle(SKETCH15_R)
        with Locations((-43.942, -85.852)):
            Circle(SKETCH15_R)
    extrude(amount=CUT_EXTRUDE10_DEPTH, mode=Mode.SUBTRACT)
    extrude(cut_extrude10_sk.sketch, amount=-CUT_EXTRUDE10_DEPTH_BACK, mode=Mode.SUBTRACT)


solid = part.part
